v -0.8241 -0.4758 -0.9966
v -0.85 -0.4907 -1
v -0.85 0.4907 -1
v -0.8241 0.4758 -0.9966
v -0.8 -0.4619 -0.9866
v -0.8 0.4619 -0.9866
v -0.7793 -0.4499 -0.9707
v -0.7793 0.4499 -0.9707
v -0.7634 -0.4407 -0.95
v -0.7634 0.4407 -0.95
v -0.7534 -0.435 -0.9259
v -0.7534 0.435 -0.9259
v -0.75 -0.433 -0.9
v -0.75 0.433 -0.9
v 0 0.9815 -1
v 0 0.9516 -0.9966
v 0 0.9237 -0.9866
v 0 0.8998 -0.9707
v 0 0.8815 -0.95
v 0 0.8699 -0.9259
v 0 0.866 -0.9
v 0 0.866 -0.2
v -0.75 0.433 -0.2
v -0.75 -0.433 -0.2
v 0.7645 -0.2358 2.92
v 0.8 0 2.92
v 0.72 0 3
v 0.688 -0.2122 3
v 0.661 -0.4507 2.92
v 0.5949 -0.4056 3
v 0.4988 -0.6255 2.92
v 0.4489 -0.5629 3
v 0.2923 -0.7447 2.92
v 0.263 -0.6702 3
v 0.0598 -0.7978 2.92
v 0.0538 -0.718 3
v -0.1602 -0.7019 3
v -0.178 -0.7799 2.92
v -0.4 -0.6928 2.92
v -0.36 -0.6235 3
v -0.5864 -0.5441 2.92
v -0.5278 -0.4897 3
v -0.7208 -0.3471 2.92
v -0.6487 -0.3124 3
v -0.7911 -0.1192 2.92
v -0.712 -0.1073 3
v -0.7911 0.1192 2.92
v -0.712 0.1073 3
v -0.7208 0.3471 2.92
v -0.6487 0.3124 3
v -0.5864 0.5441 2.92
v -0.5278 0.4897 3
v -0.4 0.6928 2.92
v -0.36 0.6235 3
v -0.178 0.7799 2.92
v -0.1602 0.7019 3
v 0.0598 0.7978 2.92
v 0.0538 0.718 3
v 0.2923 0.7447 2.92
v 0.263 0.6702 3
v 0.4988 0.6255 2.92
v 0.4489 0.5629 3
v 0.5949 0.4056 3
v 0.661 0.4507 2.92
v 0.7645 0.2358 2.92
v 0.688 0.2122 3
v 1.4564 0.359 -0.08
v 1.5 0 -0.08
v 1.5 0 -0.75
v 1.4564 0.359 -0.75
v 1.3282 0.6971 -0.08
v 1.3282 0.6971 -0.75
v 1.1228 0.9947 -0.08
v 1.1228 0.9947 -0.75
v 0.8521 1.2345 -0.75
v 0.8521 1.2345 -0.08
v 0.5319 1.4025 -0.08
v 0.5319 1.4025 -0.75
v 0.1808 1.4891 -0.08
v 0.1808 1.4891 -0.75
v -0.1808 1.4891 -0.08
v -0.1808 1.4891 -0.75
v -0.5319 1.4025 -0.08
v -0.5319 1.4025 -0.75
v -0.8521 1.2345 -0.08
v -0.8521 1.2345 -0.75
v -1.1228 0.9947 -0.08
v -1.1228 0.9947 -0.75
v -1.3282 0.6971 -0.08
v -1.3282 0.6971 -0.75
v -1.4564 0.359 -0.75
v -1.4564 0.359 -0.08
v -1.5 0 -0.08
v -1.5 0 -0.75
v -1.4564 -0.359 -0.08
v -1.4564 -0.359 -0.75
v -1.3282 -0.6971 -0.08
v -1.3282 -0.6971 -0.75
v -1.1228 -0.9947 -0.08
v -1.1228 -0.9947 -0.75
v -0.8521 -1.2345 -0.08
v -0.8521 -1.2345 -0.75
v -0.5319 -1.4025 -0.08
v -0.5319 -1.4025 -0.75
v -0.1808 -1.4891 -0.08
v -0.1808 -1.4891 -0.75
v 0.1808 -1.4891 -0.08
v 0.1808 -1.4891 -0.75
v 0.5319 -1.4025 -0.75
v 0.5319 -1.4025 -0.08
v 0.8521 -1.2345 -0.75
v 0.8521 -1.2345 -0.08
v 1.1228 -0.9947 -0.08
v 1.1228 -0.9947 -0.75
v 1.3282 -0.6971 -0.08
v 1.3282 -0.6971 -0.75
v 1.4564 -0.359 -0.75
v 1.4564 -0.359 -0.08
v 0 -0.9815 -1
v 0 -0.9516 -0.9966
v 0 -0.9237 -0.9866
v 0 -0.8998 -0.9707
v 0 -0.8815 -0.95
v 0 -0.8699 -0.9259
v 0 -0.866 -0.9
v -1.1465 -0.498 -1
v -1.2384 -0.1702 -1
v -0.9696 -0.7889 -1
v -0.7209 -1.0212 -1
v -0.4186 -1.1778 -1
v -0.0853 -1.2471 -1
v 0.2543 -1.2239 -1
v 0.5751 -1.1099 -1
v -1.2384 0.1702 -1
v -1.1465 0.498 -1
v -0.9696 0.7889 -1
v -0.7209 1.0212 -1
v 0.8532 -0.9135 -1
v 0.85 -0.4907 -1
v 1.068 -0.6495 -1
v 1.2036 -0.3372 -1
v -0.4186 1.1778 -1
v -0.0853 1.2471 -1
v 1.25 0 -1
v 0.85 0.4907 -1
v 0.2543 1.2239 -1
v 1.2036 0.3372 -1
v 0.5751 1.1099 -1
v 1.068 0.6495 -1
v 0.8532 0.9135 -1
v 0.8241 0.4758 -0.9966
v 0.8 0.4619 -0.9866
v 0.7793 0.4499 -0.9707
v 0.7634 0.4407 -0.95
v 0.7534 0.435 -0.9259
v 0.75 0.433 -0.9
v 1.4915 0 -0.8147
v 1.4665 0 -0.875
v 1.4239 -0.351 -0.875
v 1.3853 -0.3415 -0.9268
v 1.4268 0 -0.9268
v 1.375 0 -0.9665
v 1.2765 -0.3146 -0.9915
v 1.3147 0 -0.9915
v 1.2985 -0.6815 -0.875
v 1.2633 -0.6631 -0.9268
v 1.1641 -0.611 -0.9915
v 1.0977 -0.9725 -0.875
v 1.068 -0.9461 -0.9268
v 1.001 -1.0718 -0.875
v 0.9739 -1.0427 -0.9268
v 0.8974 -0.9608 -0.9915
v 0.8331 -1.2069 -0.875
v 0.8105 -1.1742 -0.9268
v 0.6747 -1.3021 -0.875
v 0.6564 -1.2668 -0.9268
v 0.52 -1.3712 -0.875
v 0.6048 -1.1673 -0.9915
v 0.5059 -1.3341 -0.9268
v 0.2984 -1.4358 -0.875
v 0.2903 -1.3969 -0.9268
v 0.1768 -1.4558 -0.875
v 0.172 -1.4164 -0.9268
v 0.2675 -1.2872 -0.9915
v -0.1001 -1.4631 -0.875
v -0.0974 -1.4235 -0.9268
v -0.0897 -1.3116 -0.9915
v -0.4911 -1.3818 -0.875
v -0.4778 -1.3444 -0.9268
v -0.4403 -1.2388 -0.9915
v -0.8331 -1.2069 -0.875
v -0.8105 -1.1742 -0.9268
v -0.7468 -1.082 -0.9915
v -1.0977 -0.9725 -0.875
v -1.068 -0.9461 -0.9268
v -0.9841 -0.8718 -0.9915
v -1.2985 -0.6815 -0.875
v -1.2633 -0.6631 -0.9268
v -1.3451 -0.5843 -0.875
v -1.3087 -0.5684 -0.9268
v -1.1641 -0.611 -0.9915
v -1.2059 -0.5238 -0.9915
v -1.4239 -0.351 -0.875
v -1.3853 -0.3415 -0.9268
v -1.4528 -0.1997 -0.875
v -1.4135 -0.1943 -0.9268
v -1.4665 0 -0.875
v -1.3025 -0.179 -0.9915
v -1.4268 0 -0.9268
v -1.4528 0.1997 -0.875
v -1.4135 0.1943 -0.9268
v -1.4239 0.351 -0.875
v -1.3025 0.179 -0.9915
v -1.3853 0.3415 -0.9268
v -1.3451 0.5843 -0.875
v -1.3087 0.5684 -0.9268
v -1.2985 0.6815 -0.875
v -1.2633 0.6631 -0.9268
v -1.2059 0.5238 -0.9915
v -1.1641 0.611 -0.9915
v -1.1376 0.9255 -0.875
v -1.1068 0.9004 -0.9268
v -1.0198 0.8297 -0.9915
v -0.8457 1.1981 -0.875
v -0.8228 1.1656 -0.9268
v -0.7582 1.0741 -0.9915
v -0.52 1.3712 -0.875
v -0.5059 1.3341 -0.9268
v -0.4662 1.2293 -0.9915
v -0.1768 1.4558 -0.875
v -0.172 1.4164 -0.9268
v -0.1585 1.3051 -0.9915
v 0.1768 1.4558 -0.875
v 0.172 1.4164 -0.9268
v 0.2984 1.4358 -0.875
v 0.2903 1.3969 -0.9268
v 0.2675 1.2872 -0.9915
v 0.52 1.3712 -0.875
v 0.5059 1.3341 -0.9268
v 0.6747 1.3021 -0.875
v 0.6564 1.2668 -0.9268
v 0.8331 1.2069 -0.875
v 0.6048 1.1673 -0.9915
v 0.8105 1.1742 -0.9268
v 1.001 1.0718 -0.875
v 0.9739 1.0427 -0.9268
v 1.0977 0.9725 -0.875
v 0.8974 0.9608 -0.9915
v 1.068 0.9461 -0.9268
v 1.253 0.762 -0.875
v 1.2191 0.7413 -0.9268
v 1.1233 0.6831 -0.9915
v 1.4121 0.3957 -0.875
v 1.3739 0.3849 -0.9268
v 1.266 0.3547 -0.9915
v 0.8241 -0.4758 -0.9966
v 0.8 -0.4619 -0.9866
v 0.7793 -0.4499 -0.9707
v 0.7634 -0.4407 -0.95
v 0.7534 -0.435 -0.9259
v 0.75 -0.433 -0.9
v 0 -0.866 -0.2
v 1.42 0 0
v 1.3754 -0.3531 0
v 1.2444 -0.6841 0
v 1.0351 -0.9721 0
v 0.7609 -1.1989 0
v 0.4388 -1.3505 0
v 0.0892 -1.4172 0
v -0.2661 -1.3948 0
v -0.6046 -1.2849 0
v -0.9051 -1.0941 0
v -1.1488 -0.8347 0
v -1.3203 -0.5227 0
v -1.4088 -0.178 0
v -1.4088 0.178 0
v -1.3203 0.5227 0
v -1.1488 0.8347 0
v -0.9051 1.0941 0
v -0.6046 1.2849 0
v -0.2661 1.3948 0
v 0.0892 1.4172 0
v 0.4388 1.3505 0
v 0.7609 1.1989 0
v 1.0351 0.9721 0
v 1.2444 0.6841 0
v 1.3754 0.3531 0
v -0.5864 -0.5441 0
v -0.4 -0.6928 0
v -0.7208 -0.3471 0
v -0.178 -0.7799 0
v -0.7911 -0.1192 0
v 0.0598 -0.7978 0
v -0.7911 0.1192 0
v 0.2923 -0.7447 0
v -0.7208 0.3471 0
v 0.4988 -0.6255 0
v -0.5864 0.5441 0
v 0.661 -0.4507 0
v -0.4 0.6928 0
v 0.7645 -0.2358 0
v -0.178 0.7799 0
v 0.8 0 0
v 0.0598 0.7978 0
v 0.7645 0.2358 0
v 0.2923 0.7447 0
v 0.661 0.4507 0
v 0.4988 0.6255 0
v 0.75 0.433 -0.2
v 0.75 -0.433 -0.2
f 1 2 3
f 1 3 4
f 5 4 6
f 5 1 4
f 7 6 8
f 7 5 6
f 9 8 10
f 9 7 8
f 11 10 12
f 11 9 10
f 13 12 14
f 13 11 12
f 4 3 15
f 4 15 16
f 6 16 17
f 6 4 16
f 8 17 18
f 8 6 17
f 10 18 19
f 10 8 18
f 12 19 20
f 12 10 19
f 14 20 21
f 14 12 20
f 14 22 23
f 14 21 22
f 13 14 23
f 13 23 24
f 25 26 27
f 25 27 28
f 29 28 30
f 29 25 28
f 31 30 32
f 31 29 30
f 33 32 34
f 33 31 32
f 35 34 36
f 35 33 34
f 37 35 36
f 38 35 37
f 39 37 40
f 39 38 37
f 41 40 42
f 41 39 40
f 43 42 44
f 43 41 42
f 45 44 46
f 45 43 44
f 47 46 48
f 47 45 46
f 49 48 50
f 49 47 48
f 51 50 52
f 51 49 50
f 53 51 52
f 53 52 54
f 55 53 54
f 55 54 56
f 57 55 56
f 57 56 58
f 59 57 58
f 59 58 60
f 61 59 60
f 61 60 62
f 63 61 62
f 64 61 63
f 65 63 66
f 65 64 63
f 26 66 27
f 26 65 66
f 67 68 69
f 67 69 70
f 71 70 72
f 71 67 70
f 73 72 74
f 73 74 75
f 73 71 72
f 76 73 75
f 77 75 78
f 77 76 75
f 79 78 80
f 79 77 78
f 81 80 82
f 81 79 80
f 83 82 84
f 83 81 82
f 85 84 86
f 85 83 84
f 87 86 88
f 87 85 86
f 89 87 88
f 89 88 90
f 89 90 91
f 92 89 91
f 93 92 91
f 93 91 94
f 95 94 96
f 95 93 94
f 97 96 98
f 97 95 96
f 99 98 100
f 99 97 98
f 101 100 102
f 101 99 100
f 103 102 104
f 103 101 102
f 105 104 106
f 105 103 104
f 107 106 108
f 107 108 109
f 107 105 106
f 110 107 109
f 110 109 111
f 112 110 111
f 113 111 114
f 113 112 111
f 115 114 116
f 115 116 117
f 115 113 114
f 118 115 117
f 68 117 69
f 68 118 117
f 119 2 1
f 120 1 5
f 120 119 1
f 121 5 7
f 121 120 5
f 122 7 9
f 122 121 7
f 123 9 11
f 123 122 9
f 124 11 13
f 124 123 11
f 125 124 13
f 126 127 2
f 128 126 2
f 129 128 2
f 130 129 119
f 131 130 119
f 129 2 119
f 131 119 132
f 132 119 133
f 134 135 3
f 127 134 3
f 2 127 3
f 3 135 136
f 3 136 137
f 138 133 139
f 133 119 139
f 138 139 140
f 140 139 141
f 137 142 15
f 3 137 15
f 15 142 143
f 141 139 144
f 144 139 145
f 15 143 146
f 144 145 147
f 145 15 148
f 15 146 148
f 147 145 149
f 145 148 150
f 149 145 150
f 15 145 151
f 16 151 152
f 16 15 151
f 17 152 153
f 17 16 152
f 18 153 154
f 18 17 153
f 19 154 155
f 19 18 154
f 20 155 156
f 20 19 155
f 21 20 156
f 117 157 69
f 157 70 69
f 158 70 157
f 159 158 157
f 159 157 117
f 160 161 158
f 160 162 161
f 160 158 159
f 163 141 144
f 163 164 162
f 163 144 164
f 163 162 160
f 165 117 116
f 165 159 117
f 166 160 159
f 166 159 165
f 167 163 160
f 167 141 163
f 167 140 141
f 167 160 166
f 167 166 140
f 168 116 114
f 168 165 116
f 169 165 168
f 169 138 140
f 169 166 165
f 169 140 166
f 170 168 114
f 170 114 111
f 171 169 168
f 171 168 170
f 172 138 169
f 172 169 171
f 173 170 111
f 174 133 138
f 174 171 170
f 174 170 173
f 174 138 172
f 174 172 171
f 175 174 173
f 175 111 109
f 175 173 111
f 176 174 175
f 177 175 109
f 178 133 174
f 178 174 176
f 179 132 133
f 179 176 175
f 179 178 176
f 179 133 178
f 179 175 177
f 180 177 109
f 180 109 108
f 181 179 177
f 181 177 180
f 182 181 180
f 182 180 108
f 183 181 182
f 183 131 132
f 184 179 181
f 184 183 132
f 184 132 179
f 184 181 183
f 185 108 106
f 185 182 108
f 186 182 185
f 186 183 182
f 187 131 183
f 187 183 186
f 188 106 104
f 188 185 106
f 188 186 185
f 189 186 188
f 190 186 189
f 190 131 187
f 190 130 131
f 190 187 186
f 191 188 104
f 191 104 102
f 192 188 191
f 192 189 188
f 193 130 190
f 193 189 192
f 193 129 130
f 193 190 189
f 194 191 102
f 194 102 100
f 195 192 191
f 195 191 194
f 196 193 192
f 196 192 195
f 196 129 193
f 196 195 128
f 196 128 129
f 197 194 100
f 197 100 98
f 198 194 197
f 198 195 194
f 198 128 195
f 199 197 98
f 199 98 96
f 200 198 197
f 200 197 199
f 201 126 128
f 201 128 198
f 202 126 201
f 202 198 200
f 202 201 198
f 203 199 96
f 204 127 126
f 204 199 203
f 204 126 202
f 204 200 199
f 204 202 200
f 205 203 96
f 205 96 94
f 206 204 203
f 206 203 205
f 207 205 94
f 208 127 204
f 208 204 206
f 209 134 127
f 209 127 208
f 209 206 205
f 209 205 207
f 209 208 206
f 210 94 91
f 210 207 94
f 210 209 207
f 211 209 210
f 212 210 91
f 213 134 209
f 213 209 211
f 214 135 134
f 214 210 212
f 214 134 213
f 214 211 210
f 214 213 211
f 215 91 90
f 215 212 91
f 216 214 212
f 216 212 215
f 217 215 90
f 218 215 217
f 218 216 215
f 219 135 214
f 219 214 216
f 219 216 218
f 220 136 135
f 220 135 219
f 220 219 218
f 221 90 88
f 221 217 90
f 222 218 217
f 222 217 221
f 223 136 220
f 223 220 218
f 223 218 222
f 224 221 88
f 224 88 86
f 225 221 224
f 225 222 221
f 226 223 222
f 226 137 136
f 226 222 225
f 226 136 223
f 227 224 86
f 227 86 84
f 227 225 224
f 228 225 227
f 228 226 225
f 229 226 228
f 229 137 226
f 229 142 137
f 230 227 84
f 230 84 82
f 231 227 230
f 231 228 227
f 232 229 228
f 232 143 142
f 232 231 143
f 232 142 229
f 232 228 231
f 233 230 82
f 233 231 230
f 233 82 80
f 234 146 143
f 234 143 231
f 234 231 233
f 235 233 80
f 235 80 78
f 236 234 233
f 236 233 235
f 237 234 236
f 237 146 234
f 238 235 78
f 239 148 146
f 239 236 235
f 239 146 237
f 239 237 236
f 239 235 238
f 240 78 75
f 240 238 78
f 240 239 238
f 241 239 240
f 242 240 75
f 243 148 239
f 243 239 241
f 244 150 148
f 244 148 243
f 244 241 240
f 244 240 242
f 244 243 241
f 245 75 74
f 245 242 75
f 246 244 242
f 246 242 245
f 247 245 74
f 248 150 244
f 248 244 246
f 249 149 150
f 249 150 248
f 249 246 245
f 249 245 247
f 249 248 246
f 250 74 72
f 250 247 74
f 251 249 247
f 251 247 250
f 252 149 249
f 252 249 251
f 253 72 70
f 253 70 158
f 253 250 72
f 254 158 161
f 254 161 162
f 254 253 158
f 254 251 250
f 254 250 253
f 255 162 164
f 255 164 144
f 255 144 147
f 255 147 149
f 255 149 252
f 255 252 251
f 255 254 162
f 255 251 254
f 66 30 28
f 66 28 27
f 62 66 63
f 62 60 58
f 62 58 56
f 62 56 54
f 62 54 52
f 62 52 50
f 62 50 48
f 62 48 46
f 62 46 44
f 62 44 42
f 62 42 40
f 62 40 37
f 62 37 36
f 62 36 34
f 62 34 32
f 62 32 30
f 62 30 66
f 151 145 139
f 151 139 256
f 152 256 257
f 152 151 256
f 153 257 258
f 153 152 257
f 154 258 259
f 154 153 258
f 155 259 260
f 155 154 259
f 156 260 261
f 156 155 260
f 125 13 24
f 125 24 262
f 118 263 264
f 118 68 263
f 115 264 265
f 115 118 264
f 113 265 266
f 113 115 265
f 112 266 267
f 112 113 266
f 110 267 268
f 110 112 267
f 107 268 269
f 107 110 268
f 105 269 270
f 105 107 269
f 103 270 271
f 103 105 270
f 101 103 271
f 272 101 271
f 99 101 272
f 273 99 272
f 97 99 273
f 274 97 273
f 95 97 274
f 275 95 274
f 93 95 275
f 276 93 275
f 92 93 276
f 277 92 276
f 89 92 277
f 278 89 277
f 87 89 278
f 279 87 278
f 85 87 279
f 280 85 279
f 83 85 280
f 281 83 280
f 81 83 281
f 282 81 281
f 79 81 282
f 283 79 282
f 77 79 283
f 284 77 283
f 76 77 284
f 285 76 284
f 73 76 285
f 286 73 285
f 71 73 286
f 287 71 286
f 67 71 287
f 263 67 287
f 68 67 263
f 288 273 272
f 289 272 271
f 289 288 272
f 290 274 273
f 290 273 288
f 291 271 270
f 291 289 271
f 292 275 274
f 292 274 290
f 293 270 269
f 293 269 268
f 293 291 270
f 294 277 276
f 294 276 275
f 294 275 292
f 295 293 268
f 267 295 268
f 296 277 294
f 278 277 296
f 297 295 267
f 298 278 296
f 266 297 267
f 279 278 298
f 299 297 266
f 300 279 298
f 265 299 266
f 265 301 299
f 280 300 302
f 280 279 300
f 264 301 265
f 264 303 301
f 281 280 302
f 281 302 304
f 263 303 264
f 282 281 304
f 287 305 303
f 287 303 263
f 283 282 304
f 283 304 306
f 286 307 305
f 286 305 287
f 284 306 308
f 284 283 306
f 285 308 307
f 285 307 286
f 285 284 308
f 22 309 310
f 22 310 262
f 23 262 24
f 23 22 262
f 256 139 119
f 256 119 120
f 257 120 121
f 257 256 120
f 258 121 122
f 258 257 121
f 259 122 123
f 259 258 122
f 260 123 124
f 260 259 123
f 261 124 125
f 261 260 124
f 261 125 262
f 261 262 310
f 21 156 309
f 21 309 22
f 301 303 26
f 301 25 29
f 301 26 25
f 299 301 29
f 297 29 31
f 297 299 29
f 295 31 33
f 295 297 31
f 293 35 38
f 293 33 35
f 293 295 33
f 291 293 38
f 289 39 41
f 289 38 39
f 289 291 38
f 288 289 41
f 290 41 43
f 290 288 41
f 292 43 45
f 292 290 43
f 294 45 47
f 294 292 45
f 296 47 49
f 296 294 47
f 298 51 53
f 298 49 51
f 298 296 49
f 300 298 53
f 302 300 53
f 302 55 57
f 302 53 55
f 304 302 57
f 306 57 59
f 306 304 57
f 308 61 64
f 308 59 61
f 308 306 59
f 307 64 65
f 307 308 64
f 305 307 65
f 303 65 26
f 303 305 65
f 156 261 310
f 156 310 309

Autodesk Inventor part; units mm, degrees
ref_plane "YZ Plane" through (0, 0, 0) normal (1, 0, 0) x (0, 1, 0)
ref_plane "XZ Plane" through (0, 0, 0) normal (0, 1, 0) x (-1, 0, 0)
ref_plane "XY Plane" through (0, 0, 0) normal (0, 0, 1) x (1, 0, 0)
sketch "Sketch1" plane through (0, 0, 0) normal (0, 0, 1) x (1, 0, 0)
  circle A0 centre (0, 0) radius 0.8
  circle A1 centre (0, 0) radius 1.5
  dimension "d0" = 1.6
  dimension "d1" = 3
extrude "Extrusion1" add sketch "Sketch1" along normal blind 3 contours A0
extrude "Extrusion2" add sketch "Sketch1" against normal blind 1 contours A0 | A1
sketch "Sketch2" plane through (0, 0, -1) normal (0, 0, -1) x (-1, 0, 0)
  line L0 (-0.75, 0.433) -> (0, 0.866)
  line L1 (0, 0.866) -> (0.75, 0.433)
  line L2 (0.75, 0.433) -> (0.75, -0.433)
  line L3 (0.75, -0.433) -> (0, -0.866)
  line L4 (0, -0.866) -> (-0.75, -0.433)
  line L5 (-0.75, -0.433) -> (-0.75, 0.433)
  point P0 (0, 0)
  point P1 (0, 0)
  dimension "d6" = 1.5
extrude "Extrusion3" cut sketch "Sketch2" against normal blind 0.8
fillet "Fillet1" radius 0.25 1 edges at (-1.5, 0, -1)
fillet "Fillet1" radius 0.1 6 edges at (0.375, 0.6495, -1) (0.75, 0, -1) (0.375, -0.6495, -1) (-0.375, -0.6495, -1) (-0.75, 0, -1) (-0.375, 0.6495, -1)
thread "Thread1" size "M1.6x0.35" class "6g" standard "ANSI Metric M Profile" full length
chamfer "Chamfer1" distance 0.08 angle 45 2 edges at (-0.8, 0, 3) (-1.5, 0, 0)
properties part number "CNCT_STEEL_M1,6x3_Screw" material "Stainless Steel"
